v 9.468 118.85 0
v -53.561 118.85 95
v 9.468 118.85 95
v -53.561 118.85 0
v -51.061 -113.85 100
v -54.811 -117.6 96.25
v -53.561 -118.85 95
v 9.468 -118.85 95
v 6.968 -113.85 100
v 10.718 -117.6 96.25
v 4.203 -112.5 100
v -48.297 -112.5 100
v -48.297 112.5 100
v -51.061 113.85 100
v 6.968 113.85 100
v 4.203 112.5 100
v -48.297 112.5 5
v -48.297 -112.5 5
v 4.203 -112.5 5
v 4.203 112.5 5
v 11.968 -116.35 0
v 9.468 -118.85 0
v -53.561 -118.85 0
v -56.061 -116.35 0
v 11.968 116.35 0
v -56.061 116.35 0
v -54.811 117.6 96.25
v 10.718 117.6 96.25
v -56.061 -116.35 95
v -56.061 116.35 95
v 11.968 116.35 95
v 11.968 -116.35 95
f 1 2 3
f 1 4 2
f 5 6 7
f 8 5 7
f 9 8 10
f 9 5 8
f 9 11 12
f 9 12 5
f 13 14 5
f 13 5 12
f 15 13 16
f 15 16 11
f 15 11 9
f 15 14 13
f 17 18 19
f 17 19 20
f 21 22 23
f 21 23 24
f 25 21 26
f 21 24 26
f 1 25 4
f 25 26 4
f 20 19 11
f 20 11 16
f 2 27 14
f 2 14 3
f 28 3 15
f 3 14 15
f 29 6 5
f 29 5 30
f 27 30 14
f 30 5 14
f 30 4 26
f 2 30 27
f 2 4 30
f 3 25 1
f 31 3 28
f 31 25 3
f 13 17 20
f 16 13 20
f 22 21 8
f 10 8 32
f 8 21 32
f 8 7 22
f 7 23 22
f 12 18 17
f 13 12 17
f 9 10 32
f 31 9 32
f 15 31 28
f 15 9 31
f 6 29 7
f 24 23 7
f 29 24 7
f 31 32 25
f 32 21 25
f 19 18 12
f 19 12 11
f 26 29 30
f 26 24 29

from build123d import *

# Parameters (mm, degrees)
F0_W     = 68.029277
F0_H     = 237.70012
F0_W_2   = 52.5
F0_H_2   = 225
F1_DEPTH = 100
F2_W     = 225
F2_H     = 5
F3_DEPTH = 52.5
F4_SIZE  = 5
F5_SIZE  = 2.5


with BuildPart() as f1:
    # F0 (on Top) → F1 (new body)
    with BuildSketch(Plane.XY):
        with Locations((-22.046504, 0)):
            Rectangle(F0_W, F0_H)
        with Locations((-22.046504, 0)):
            Rectangle(F0_W_2, F0_H_2, mode=Mode.SUBTRACT)
    extrude(amount=F1_DEPTH)

    # F2 (on face) → F3 (join)
    with BuildSketch(Plane.YZ.offset(-48.296504)):
        with Locations((0, 2.5)):
            Rectangle(F2_W, F2_H)
    extrude(amount=F3_DEPTH)

    # F4
    f4_edges = [f1.edges().sort_by_distance(p)[0] for p in [
        (-56.061142, 0, 100),
        (-22.046504, -118.85006, 100),
        (11.968135, 0, 100),
        (-22.046504, 118.85006, 100),
    ]]
    chamfer(f4_edges, length=F4_SIZE)

    # F5
    f5_edges = [f1.edges().sort_by_distance(p)[0] for p in [
        (-56.061142, -118.85006, 47.5),
        (11.968135, -118.85006, 47.5),
        (11.968135, 118.85006, 47.5),
        (-56.061142, 118.85006, 47.5),
    ]]
    chamfer(f5_edges, length=F5_SIZE)


solid = f1.part
